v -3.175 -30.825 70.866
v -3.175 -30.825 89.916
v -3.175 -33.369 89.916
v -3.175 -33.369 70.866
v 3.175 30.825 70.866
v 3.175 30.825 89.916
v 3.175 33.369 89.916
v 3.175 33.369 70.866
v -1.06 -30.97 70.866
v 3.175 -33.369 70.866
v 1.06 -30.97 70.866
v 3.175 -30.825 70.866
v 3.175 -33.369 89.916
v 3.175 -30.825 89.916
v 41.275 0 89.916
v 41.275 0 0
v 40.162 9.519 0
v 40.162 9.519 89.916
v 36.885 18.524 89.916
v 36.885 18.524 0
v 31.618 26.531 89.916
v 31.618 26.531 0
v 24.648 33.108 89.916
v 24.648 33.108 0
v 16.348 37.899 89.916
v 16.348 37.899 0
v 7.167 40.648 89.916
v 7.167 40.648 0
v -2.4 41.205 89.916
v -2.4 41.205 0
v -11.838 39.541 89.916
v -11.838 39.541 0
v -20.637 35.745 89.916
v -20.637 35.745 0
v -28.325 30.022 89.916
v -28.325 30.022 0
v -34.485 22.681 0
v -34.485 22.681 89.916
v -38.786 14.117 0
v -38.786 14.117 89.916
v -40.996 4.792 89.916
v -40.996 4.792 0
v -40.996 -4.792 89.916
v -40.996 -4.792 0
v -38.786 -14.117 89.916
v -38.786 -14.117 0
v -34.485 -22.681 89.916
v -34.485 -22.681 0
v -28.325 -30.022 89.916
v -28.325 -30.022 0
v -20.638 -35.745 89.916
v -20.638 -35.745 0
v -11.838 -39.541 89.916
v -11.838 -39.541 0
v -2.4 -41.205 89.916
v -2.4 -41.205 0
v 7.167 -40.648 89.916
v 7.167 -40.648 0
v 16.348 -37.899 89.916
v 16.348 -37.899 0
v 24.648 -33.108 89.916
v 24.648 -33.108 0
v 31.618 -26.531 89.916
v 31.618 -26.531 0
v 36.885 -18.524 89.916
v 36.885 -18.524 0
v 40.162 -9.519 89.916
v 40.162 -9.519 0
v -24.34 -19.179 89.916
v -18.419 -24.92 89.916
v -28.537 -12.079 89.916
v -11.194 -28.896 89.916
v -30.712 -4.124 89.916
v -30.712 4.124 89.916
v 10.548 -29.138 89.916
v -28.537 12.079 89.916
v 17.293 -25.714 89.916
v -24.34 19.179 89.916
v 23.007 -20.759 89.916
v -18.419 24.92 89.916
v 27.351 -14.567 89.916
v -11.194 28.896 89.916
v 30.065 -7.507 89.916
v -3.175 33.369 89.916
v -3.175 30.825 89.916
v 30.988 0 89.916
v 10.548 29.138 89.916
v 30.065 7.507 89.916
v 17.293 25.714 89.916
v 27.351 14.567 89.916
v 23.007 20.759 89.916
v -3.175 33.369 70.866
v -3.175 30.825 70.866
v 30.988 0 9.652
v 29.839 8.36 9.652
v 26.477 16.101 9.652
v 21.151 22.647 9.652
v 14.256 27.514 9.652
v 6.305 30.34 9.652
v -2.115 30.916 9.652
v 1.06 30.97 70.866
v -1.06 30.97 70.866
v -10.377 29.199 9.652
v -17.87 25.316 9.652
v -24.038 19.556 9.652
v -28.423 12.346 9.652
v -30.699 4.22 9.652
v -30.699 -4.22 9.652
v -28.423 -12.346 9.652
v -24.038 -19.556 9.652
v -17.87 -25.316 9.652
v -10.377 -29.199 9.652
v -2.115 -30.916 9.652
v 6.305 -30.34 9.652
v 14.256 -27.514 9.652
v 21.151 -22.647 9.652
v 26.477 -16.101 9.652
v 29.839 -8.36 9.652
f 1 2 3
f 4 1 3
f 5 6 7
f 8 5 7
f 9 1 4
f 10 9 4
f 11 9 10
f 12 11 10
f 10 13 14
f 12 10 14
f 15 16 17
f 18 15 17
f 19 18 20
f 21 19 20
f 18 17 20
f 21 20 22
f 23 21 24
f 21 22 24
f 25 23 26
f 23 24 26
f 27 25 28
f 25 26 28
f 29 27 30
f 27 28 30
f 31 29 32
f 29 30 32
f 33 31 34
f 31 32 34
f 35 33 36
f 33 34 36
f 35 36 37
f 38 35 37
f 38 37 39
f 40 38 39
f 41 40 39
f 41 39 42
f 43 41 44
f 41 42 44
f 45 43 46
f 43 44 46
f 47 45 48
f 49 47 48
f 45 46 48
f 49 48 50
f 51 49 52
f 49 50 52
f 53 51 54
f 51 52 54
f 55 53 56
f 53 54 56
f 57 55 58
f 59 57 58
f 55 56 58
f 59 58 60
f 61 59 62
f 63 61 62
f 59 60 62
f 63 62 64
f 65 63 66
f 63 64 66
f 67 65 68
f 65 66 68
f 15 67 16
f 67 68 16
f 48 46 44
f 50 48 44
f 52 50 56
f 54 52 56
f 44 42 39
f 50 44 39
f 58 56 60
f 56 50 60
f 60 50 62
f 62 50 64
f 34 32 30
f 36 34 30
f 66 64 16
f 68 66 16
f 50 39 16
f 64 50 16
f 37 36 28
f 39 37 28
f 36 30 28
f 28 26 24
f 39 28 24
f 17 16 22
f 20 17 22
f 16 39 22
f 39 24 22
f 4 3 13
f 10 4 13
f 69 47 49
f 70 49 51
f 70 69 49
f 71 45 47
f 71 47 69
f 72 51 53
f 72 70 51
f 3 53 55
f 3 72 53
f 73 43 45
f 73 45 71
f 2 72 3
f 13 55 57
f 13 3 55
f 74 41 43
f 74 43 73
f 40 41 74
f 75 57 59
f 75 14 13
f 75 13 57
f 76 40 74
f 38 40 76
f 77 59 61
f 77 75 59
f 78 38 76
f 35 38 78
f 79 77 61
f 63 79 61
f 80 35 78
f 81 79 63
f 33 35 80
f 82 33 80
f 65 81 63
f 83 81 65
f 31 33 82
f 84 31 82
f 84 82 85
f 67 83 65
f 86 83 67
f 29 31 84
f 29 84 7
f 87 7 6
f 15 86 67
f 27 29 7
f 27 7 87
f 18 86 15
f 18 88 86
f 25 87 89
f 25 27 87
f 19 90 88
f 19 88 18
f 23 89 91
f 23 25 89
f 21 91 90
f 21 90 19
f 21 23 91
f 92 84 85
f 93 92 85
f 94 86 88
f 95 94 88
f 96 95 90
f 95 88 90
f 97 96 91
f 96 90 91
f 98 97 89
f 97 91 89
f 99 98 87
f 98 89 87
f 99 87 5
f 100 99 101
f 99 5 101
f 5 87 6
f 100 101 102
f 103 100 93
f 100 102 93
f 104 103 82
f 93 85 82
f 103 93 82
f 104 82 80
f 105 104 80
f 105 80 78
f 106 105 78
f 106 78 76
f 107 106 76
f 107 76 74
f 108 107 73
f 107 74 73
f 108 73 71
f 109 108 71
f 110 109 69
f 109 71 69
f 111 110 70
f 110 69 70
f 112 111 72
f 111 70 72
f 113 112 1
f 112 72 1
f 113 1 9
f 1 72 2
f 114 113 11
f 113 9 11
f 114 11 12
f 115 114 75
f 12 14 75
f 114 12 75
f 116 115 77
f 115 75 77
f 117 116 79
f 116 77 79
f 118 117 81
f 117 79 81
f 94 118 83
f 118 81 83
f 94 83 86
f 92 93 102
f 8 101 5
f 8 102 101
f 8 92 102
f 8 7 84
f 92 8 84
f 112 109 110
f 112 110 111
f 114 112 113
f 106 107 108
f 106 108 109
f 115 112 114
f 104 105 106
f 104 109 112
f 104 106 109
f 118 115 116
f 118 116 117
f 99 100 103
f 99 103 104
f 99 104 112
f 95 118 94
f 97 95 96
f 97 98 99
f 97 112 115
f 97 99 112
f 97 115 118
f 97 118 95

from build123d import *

# Parameters (mm, degrees)
F0_R     = 41.275
F1_DEPTH = 89.916
F2_R     = 30.988
F3_DEPTH = 80.264
F5_DEPTH = 19.05


with BuildPart() as f1:
    # F0 (on Top) → F1 (new body)
    with BuildSketch(Plane.XY):
        Circle(F0_R)
    extrude(amount=F1_DEPTH)

    # F2 (on face) → F3 (cut)
    with BuildSketch(Plane.XY.offset(89.916)):
        Circle(F2_R)
    extrude(amount=-F3_DEPTH, mode=Mode.SUBTRACT)

    # F4 (on face) → F5 (cut)
    with BuildSketch(Plane.XY.offset(89.916)):
        Polygon((3.175, 33.36925), (0, 33.36925), (-3.175, 33.36925), (-3.175, 0), (-3.175, -33.36925), (0, -33.36925), (3.175, -33.36925), (3.175, 0), align=None)
    extrude(amount=-F5_DEPTH, mode=Mode.SUBTRACT)


solid = f1.part
